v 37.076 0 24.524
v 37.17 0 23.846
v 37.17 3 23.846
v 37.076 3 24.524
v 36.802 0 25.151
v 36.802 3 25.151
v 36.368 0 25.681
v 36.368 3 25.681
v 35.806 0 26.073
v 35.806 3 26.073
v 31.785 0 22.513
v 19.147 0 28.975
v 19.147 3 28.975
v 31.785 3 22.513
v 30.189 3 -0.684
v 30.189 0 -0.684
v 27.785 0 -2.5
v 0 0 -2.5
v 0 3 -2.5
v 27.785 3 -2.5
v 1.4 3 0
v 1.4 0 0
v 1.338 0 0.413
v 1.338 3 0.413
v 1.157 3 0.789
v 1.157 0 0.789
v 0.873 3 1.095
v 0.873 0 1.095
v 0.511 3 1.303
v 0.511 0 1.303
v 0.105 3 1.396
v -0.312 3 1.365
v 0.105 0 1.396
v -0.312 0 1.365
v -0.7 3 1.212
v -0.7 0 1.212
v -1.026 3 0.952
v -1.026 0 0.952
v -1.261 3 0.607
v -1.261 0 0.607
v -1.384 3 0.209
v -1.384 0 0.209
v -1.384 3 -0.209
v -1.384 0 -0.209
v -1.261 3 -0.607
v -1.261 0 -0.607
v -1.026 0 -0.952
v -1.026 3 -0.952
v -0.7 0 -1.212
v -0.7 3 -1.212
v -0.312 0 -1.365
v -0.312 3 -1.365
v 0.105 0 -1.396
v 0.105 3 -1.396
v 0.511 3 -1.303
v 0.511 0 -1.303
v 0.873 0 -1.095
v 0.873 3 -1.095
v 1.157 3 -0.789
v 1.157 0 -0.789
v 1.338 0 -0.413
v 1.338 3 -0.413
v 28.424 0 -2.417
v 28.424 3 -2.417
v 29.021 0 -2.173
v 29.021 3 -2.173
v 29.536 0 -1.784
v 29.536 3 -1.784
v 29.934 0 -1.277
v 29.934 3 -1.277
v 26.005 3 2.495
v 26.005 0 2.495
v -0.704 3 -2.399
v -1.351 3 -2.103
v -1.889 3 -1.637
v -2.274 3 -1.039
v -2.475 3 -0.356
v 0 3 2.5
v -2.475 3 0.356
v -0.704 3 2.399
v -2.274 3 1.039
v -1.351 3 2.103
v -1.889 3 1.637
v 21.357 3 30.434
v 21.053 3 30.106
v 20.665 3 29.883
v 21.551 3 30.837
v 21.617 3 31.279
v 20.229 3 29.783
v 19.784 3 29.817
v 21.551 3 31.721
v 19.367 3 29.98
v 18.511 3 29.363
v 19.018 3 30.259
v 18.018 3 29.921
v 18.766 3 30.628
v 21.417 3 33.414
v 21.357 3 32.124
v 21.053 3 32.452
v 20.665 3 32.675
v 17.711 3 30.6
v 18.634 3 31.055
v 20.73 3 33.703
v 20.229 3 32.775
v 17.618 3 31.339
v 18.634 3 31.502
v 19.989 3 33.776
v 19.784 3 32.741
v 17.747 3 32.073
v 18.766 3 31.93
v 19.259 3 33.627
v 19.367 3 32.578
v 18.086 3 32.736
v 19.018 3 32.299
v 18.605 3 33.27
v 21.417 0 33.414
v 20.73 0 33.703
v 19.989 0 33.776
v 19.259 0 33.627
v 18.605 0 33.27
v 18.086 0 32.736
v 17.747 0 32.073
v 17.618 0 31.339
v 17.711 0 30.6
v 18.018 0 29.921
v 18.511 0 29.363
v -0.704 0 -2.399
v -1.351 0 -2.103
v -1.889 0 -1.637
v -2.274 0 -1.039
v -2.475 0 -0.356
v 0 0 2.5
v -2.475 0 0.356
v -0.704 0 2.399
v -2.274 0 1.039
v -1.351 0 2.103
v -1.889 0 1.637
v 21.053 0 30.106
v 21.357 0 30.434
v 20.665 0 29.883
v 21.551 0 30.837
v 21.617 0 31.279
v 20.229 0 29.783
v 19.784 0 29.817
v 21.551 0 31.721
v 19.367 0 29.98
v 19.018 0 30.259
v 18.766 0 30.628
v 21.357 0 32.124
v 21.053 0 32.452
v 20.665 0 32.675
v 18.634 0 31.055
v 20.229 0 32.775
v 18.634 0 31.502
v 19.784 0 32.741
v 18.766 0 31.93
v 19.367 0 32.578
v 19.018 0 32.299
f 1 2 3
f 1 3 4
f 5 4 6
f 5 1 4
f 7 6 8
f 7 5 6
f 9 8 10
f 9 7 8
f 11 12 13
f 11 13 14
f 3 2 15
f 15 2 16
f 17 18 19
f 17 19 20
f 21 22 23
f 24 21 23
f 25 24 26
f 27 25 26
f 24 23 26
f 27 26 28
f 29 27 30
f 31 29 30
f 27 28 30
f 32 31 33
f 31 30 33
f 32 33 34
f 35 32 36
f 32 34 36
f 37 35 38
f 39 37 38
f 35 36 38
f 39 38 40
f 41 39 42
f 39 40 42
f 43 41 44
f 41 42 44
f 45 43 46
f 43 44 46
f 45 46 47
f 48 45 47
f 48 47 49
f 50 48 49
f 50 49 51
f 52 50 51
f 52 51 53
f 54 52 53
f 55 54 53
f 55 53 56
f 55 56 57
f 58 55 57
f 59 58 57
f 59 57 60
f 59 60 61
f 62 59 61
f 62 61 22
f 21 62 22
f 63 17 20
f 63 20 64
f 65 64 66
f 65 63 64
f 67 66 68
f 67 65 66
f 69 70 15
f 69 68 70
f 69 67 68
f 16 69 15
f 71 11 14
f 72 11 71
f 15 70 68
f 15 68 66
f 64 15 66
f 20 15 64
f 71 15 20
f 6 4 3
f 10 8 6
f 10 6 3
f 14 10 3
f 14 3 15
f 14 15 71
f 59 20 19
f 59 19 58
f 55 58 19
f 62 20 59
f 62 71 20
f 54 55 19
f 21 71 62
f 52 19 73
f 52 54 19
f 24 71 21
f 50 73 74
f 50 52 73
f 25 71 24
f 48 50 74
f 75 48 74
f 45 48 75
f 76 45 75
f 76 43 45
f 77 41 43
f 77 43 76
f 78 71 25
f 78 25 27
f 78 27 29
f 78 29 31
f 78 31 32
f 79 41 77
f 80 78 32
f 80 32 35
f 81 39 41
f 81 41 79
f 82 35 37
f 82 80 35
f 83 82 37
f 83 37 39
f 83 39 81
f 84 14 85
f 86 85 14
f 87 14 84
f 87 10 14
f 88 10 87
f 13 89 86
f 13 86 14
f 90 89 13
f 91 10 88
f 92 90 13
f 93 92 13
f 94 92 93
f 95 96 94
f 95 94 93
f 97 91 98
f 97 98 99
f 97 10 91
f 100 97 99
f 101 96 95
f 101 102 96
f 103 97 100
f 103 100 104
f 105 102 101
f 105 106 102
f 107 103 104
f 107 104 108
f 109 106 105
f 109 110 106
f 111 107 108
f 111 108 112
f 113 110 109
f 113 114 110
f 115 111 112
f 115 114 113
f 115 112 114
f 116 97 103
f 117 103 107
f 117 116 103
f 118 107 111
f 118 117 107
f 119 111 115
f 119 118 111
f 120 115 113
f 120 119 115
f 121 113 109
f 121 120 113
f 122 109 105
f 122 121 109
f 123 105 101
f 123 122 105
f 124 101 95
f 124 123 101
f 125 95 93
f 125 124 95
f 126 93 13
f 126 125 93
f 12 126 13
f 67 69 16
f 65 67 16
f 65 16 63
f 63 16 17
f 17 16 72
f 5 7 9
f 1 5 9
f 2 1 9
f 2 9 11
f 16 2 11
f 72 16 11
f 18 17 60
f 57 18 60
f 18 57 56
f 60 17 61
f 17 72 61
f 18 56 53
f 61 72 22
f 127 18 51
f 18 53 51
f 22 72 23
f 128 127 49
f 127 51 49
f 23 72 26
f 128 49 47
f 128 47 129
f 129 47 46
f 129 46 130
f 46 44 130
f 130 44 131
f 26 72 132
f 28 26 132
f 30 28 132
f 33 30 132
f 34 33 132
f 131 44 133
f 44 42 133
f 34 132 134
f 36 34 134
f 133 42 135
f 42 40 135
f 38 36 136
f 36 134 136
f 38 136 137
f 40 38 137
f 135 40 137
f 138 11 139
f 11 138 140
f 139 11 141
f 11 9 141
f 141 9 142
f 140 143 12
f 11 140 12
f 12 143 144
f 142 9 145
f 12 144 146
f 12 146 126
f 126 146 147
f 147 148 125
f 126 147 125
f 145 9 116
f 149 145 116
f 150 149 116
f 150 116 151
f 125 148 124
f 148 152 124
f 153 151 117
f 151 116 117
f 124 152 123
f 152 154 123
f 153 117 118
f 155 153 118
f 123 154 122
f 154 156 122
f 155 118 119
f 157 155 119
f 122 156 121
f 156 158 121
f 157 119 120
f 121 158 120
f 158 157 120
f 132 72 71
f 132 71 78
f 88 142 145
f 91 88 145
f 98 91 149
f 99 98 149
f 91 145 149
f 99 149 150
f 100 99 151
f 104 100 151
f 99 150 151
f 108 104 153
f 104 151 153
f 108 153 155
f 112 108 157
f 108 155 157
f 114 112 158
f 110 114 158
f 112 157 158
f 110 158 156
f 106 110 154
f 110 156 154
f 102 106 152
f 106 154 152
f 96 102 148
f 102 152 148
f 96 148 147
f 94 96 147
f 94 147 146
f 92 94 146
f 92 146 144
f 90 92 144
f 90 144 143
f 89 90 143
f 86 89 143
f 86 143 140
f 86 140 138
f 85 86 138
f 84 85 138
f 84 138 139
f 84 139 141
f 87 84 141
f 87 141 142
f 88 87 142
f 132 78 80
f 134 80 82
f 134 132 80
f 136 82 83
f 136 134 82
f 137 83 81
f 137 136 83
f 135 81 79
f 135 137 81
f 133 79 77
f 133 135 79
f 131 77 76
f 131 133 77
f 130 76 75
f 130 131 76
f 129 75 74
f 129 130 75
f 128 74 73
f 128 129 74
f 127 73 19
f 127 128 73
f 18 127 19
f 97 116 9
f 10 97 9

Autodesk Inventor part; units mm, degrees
ref_plane "YZ Plane" through (0, 0, 0) normal (1, 0, 0) x (0, 1, 0)
ref_plane "XZ Plane" through (0, 0, 0) normal (0, 1, 0) x (-1, 0, 0)
ref_plane "XY Plane" through (0, 0, 0) normal (0, 0, 1) x (1, 0, 0)
sketch "Sketch1" plane through (0, 0, 0) normal (0, 1, 0) x (-1, 0, 0)
  circle A0 centre (0, 0) radius 2.5
  circle A1 centre (-27.7848, -0.0003) radius 2.5
  circle A2 centre (-34.6699, 23.8458) radius 2.5
  circle A3 centre (-20.1174, 31.2789) radius 2.5
  line L0 (-32.1699, 23.8458) -> (-25.2848, -0.0003)
  line L1 (-37.1699, 23.8458) -> (-30.1893, -0.6845)
  line L2 (-27.9447, 2.4946) -> (-0.0005, 2.5)
  line L3 (-0.0005, -2.5) -> (-27.7848, -2.5003)
  line L4 (-19.1471, 28.9749) -> (-33.5318, 21.6199)
  arc A4 (-33.5318, 21.6199) -> (-35.8061, 26.0727) centre (-34.6699, 23.8458) ccw
  line L5 (-21.4171, 33.4145) -> (-35.8061, 26.0727)
  dimension "d0" = 5
  dimension "d1" = 5
  dimension "d2" = 5
  dimension "d3" = 5
extrude "Extrusion1" add sketch "Sketch1" along normal blind 3 contours A0 | A0 L3 A1 L0 L2 | L0 A1 L1 A2 L4 | A1 L0 | L4 A2 L0 | L0 A2 L5 A3 L4 | A1 L0 | A2 L1 | A3 picked at (-35.4421, 23.1763)
sketch "Sketch2" plane through (0, 0, 0) normal (0, -1, 0) x (1, 0, 0)
  circle A0 centre (0, 0) radius 1.4
  dimension "d6" = 2.8
extrude "Extrusion2" cut sketch "Sketch2" against normal blind 8
thread "Thread2" size "M3x0.5" class "6H" standard "ANSI Metric M Profile" full length
sketch "Sketch3" plane through (0, 0, 0) normal (0, -1, 0) x (1, 0, 0)
  arc A0 (21.4171, 33.4145) -> (19.1471, 28.9749) centre (20.1174, 31.2789) ccw projected
  circle A1 centre (20.1174, 31.2789) radius 1.5
  point P0 (0, 0)
  dimension "d13" = 3
extrude "Extrusion3" cut sketch "Sketch3" against normal blind 10
thread "Thread3" size "M3x0.5" class "6H" standard "ANSI Metric M Profile" full length
properties part number "Servo_Arm_Hook_F_new"
